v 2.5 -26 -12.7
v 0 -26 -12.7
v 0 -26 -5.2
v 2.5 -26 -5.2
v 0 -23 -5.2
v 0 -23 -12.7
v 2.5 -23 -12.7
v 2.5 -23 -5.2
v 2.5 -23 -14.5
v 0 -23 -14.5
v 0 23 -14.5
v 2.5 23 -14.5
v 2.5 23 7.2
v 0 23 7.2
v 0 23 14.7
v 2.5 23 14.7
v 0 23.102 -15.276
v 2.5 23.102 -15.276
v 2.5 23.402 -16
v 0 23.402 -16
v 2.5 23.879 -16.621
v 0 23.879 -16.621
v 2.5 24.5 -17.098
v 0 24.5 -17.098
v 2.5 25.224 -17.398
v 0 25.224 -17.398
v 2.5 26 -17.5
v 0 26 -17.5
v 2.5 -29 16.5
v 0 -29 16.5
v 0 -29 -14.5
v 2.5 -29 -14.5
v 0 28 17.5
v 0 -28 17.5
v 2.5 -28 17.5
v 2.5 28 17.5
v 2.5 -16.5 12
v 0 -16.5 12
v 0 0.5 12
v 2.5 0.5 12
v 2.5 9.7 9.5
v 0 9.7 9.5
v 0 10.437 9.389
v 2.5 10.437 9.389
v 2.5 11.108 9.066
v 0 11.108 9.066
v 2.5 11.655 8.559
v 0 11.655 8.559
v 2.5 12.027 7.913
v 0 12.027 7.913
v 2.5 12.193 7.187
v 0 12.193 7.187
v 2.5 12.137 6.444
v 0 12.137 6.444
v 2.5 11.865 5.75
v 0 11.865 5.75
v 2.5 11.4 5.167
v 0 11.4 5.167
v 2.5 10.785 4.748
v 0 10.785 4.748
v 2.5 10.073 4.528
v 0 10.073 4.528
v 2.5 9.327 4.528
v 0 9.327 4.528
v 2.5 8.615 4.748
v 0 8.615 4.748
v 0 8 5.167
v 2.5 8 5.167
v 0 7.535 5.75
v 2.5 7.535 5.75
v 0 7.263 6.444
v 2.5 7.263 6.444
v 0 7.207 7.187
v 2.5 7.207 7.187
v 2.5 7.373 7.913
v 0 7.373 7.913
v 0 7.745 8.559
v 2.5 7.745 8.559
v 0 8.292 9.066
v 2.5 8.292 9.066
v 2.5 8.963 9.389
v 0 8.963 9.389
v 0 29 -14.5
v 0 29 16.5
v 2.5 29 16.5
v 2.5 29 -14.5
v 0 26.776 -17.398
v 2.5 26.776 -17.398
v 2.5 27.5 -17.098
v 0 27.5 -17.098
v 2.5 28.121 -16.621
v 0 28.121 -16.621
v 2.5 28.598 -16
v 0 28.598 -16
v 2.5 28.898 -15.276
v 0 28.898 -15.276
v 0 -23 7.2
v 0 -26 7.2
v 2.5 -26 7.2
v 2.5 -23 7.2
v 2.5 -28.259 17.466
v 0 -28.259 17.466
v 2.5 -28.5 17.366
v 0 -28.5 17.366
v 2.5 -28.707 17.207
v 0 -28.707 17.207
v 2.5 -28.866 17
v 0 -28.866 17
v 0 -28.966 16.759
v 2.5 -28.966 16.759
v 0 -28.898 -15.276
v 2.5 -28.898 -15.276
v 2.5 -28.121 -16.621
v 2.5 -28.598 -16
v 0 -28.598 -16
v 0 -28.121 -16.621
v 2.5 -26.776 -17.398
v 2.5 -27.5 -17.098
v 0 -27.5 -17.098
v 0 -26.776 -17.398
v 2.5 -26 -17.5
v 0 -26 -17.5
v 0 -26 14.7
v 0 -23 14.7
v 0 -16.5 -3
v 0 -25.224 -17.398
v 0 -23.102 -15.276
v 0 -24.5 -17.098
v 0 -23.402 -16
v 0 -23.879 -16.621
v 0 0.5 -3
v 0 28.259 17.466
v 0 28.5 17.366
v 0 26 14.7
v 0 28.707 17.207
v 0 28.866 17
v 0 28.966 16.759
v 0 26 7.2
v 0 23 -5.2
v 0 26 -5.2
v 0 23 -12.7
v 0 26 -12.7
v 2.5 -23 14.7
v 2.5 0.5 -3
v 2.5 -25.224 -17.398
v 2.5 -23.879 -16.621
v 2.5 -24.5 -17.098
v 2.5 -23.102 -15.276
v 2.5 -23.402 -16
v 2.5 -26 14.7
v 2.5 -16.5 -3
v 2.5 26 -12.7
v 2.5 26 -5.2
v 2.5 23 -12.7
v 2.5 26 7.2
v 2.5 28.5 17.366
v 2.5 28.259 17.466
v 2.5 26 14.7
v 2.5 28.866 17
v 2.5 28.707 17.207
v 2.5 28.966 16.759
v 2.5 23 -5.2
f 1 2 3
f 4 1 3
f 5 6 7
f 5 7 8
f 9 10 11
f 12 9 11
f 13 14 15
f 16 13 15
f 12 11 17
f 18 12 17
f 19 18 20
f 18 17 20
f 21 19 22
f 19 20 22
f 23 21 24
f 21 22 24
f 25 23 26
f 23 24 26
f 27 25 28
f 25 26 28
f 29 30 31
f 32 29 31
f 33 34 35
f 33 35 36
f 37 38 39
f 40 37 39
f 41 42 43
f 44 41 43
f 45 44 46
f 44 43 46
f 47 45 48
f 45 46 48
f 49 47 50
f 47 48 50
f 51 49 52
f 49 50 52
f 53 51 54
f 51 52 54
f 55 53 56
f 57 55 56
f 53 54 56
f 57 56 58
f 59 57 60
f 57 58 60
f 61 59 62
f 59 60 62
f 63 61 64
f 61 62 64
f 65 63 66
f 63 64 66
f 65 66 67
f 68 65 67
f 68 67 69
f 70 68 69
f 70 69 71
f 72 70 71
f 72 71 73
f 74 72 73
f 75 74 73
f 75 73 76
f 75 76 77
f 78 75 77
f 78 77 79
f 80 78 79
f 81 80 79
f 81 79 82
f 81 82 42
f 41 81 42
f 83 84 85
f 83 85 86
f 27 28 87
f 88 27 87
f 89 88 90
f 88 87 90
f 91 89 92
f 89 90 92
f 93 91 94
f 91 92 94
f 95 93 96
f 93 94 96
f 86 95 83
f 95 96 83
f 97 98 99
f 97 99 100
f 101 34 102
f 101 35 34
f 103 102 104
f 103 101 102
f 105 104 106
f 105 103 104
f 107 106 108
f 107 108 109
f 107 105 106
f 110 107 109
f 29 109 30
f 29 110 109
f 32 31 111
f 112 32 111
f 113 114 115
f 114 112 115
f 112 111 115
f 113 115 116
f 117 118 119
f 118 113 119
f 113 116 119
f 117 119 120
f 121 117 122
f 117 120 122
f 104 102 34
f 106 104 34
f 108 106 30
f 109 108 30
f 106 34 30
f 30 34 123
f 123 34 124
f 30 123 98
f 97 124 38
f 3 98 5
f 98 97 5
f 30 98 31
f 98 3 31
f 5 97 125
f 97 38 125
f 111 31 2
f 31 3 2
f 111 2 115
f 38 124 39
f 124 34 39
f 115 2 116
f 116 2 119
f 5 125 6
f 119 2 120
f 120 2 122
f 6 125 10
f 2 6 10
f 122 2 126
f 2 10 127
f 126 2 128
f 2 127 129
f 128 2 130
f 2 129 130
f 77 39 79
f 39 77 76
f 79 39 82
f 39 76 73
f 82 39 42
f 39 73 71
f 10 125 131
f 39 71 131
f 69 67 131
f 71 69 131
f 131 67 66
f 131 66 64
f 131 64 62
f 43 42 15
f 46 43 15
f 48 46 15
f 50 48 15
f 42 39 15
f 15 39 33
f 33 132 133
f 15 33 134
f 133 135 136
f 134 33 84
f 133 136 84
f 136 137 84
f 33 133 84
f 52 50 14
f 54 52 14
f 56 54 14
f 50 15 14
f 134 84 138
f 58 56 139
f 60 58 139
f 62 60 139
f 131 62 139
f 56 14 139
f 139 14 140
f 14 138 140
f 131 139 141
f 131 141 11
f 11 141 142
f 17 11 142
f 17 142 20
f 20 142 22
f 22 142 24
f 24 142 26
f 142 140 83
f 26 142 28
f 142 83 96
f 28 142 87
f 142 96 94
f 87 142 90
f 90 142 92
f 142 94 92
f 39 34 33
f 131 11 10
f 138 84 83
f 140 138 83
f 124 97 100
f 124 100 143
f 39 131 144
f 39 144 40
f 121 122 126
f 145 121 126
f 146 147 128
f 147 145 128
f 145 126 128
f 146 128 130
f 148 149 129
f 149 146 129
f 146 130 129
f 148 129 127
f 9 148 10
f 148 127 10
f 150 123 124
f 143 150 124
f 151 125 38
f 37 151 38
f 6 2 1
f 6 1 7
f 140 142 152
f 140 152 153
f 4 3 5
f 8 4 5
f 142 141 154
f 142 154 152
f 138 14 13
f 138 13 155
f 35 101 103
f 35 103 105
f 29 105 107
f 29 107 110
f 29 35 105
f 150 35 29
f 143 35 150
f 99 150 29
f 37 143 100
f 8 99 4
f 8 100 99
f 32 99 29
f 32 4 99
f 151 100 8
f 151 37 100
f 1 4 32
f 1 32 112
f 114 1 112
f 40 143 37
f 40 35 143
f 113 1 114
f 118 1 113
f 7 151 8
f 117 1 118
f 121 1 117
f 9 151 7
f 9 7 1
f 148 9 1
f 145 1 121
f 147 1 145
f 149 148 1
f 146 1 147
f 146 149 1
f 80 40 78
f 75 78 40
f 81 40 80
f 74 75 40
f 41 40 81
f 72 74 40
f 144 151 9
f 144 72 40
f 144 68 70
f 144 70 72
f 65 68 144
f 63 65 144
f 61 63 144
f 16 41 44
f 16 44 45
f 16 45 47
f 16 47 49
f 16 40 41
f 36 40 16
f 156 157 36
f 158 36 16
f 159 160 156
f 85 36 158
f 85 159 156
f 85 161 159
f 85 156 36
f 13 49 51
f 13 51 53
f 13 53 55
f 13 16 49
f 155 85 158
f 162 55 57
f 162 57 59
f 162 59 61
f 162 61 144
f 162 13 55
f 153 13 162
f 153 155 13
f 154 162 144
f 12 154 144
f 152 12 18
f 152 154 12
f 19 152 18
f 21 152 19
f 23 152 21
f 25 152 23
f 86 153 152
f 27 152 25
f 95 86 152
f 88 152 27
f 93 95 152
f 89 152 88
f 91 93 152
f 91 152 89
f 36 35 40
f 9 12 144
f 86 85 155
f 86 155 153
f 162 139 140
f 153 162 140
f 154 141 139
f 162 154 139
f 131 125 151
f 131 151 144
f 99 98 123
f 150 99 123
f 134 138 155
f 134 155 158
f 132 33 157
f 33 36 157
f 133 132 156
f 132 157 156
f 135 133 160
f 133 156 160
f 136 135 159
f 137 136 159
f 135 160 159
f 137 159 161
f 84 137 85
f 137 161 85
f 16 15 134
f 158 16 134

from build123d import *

# Parameters (mm, degrees)
SKETCH_2_W          = 35
SKETCH_2_H          = 58
EXTRUDE_1_DEPTH     = 2.5
SKETCH_4_W          = 7.5
SKETCH_4_H          = 3
CUT_EXTRUDE_1_DEPTH = 3.5
CUT_EXTRUDE_2_DEPTH = 3.5
SKETCH_7_R          = 2.5
SKETCH_7_W          = 15
SKETCH_7_H          = 17
CUT_EXTRUDE_3_DEPTH = 3.5
FILLET_1_R          = 1


with BuildPart() as part:
    # 草图2 → 凸台-拉伸1 (new body)
    with BuildSketch(Plane(origin=(0, 0, 0), x_dir=(0, 0, -1), z_dir=(1, 0, 0))):
        Rectangle(SKETCH_2_W, SKETCH_2_H)
    extrude(amount=EXTRUDE_1_DEPTH)

    # 草图4 → 切除-拉伸1 (cut, through all)
    with BuildSketch(Plane.ZY):
        with Locations((-8.95, 24.5)):
            Rectangle(SKETCH_4_W, SKETCH_4_H)
        with Locations((10.95, 24.5)):
            Rectangle(SKETCH_4_W, SKETCH_4_H)
        with Locations((-8.95, -24.5)):
            Rectangle(SKETCH_4_W, SKETCH_4_H)
        with Locations((10.95, -24.5)):
            Rectangle(SKETCH_4_W, SKETCH_4_H)
    extrude(amount=-CUT_EXTRUDE_1_DEPTH, mode=Mode.SUBTRACT)

    # 草图5 → 切除-拉伸2 (cut, through all)
    with BuildSketch(Plane.ZY):
        with BuildLine():
            Line((-17.5, 29), (-17.5, 26.000000007))
            ThreePointArc((-17.5, 26.000000007), (-16.621320341, 28.121320346), (-14.5, 29))
            Line((-14.5, 29), (-17.5, 29))
        make_face()
        with BuildLine():
            Line((-14.5, 0), (-14.5, 23))
            ThreePointArc((-14.5, 23), (-16.621320346, 23.878679659), (-17.5, 26.000000007))
            Line((-17.5, 26.000000007), (-17.5, 0))
            Line((-17.5, 0), (-14.5, 0))
        make_face()
        with BuildLine():
            Line((-14.5, -23), (-14.5, 0))
            Line((-14.5, 0), (-17.5, 0))
            Line((-17.5, 0), (-17.5, -26))
            ThreePointArc((-17.5, -26), (-16.621320344, -23.878679656), (-14.5, -23))
        make_face()
        with BuildLine():
            ThreePointArc((-14.5, -29), (-16.621320344, -28.121320344), (-17.5, -26))
            Line((-17.5, -26), (-17.5, -29))
            Line((-17.5, -29), (-14.5, -29))
        make_face()
    extrude(amount=-CUT_EXTRUDE_2_DEPTH, mode=Mode.SUBTRACT)

    # 草图7 → 切除-拉伸3 (cut, through all)
    with BuildSketch(Plane.ZY):
        with Locations((7, 9.7)):
            Circle(SKETCH_7_R)
        with Locations((4.5, -8)):
            Rectangle(SKETCH_7_W, SKETCH_7_H)
    extrude(amount=-CUT_EXTRUDE_3_DEPTH, mode=Mode.SUBTRACT)

    # 圆角1
    fillet_1_edges = [part.edges().sort_by_distance(p)[0] for p in [
        (1.25, -29, 17.5),
        (1.25, 29, 17.5),
    ]]
    fillet(fillet_1_edges, radius=FILLET_1_R)


solid = part.part
